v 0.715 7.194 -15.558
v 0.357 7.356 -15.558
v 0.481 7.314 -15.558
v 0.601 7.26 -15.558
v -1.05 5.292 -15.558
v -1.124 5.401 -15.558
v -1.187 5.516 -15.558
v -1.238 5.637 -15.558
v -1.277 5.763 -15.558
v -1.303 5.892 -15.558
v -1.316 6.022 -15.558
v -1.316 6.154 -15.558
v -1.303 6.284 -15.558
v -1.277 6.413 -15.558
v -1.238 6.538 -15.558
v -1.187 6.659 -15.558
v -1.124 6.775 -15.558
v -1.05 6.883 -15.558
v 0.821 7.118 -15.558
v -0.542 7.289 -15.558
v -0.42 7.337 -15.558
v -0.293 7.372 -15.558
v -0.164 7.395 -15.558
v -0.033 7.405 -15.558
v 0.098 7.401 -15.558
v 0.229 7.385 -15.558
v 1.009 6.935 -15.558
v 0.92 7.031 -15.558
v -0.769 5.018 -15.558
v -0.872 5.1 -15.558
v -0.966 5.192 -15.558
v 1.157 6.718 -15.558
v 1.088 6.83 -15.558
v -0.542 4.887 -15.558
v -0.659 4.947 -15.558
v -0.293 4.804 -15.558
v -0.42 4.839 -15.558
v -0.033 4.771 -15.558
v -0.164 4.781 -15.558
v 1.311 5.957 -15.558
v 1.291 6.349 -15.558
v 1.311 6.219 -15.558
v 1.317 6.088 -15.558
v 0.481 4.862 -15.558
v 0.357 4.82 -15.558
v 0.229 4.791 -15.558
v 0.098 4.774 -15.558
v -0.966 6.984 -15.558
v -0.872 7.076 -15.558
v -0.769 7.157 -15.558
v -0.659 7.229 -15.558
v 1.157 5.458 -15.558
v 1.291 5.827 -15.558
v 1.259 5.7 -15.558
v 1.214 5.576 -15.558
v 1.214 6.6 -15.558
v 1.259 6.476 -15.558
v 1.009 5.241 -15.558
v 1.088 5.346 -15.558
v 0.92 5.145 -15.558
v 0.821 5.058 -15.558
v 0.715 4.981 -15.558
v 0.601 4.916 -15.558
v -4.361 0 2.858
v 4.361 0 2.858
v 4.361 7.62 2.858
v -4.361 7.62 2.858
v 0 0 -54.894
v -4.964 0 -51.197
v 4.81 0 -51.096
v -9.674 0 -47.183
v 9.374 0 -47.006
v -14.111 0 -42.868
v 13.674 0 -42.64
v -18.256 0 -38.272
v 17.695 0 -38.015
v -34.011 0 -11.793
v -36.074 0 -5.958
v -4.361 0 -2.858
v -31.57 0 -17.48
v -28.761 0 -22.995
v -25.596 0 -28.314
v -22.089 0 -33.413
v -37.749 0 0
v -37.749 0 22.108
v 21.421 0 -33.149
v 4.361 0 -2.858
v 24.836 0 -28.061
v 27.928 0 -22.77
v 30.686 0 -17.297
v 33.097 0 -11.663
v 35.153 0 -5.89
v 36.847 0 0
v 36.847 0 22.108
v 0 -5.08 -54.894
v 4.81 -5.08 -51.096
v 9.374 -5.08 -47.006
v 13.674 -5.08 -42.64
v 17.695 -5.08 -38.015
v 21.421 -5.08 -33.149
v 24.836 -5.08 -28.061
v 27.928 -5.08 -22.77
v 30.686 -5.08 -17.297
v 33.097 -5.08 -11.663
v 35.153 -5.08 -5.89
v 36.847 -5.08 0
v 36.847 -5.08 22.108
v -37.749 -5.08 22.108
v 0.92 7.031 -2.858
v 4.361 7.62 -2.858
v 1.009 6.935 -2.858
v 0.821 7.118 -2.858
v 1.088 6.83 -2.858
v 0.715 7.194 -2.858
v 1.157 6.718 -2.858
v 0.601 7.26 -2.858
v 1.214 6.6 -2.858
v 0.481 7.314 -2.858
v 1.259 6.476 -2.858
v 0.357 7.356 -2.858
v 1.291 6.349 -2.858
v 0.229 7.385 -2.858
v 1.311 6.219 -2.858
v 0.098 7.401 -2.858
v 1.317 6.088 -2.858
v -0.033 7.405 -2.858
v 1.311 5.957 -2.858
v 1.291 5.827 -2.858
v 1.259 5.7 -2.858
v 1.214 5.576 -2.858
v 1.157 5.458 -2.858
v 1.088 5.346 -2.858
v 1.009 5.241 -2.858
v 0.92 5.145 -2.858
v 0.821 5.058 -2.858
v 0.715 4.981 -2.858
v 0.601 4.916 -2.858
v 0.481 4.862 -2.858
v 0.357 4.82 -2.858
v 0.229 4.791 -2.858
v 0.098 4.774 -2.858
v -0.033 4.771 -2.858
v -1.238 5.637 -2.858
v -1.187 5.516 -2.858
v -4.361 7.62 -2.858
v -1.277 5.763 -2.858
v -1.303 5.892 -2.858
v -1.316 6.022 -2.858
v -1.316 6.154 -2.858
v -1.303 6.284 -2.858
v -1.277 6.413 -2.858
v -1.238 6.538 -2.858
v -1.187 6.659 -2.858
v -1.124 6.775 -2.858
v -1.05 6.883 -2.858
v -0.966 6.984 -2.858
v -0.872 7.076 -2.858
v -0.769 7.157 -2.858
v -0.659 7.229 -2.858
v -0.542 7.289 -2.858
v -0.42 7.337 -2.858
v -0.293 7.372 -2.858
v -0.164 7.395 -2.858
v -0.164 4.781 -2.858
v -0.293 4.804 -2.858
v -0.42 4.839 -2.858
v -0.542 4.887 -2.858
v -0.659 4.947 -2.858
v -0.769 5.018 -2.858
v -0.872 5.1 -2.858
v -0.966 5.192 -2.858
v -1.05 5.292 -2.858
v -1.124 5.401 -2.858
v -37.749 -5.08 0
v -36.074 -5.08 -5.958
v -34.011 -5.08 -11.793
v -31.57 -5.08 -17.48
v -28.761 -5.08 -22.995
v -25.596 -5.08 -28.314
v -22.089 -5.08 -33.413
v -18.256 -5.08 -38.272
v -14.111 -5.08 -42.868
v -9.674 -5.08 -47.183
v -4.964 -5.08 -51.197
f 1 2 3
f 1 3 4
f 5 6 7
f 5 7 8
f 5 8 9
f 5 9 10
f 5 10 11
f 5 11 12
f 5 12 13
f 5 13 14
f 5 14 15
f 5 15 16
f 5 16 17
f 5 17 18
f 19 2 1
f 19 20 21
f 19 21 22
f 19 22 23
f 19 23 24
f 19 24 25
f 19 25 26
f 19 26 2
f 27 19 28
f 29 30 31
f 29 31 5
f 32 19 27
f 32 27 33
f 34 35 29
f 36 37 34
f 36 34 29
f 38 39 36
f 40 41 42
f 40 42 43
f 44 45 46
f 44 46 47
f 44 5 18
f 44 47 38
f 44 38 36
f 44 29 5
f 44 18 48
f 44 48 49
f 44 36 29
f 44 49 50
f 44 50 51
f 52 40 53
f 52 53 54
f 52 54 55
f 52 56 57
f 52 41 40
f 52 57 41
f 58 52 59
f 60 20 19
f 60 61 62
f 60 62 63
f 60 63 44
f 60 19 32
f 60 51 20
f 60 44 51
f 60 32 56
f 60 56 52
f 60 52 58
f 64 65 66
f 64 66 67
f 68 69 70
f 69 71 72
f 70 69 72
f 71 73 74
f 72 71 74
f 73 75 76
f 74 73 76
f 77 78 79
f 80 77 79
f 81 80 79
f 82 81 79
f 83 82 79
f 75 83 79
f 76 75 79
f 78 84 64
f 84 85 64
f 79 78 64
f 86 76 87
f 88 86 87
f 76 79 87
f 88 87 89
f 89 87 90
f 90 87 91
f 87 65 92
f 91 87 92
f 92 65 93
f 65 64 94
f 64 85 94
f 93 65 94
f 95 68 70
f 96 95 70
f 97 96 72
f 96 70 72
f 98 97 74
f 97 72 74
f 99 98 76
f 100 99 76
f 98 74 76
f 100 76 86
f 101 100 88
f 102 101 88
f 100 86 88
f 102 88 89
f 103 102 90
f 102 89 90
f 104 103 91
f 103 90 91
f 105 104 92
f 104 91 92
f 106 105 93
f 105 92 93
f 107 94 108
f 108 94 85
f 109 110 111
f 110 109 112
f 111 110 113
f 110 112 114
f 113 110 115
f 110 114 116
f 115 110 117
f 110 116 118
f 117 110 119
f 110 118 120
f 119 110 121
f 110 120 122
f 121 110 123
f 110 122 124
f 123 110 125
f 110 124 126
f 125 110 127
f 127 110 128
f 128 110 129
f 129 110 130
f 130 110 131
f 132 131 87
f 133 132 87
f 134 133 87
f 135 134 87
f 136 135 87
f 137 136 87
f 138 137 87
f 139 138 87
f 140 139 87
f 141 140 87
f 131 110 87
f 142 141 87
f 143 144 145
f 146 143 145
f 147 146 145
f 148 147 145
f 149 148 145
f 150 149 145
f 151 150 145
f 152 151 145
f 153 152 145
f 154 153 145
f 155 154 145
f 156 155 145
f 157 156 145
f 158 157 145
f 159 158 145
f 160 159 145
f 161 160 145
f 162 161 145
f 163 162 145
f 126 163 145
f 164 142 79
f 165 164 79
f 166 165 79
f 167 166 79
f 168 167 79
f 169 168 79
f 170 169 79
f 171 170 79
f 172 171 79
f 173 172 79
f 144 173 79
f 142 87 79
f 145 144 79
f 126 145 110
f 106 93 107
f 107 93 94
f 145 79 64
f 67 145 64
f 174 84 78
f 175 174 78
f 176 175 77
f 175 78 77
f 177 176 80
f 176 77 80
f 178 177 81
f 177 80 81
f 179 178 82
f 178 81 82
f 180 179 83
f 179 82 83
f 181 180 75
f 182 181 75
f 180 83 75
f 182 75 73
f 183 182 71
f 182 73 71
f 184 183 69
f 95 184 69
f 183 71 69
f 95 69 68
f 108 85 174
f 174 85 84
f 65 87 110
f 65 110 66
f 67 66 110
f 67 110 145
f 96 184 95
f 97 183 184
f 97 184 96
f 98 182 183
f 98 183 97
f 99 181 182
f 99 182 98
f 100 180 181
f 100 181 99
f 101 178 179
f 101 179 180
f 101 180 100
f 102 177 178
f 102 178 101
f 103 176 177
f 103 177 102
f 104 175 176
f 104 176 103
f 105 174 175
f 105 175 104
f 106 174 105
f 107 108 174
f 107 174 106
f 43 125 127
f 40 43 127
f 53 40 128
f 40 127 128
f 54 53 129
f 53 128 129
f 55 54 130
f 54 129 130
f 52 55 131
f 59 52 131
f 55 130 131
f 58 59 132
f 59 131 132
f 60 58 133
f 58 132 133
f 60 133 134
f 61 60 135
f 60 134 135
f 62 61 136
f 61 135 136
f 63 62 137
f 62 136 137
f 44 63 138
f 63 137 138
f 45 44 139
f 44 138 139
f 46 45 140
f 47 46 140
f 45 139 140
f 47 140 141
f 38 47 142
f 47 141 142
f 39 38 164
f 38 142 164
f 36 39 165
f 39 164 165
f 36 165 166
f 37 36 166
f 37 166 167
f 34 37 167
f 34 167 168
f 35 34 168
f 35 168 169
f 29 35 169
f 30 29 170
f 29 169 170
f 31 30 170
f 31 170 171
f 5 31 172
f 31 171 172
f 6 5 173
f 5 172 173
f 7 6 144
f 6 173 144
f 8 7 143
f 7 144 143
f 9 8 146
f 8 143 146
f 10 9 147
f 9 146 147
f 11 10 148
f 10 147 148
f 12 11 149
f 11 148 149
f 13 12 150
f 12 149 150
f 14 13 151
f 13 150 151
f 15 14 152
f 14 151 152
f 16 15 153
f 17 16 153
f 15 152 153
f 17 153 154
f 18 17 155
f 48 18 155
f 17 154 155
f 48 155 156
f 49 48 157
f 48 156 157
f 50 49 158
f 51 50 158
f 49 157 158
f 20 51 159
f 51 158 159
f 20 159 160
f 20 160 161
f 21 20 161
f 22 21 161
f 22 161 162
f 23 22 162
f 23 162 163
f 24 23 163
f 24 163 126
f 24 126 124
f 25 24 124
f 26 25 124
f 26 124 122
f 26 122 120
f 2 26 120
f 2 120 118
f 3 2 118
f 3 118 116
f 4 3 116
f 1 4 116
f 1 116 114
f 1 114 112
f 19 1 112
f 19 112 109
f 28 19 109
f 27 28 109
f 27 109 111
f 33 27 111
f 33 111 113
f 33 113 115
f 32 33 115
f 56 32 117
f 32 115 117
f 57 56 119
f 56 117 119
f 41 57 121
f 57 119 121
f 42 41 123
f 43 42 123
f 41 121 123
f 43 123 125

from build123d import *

# Parameters (mm, degrees)
F1_DEPTH = 5.08
F2_W     = 8.722898
F2_H     = 5.715
F3_DEPTH = 7.62
F4_R     = 1.31726
F5_DEPTH = 12.7


with BuildPart() as f1:
    # F0 (on Front) → F1 (new body)
    with BuildSketch(Plane.XZ):
        with BuildLine():
            ThreePointArc((-37.749078, 0), (-23.884625, -30.892331), (0, -54.894079))
            ThreePointArc((0, -54.894079), (23.167985, -30.63179), (36.846712, 0))
            Line((36.846712, 0), (36.846712, 22.108026))
            Line((36.846712, 22.108026), (-37.749078, 22.108026))
            Line((-37.749078, 22.108026), (-37.749078, 21.205658))
            Line((-37.749078, 21.205658), (-37.749078, 0))
        make_face()
    extrude(amount=F1_DEPTH)

    # F2 (on face) → F3 (join)
    with BuildSketch(Plane(origin=(0, 0, 0), x_dir=(-1, 0, 0), z_dir=(0, 1, 0))):
        Rectangle(F2_W, F2_H)
    extrude(amount=F3_DEPTH)

    # F4 (on face) → F5 (join)
    with BuildSketch(Plane(origin=(0, 0, -2.8575), x_dir=(1, 0, 0), z_dir=(0, 0, -1))):
        with Locations((0, -6.087864)):
            Circle(F4_R)
    extrude(amount=F5_DEPTH)


solid = f1.part
